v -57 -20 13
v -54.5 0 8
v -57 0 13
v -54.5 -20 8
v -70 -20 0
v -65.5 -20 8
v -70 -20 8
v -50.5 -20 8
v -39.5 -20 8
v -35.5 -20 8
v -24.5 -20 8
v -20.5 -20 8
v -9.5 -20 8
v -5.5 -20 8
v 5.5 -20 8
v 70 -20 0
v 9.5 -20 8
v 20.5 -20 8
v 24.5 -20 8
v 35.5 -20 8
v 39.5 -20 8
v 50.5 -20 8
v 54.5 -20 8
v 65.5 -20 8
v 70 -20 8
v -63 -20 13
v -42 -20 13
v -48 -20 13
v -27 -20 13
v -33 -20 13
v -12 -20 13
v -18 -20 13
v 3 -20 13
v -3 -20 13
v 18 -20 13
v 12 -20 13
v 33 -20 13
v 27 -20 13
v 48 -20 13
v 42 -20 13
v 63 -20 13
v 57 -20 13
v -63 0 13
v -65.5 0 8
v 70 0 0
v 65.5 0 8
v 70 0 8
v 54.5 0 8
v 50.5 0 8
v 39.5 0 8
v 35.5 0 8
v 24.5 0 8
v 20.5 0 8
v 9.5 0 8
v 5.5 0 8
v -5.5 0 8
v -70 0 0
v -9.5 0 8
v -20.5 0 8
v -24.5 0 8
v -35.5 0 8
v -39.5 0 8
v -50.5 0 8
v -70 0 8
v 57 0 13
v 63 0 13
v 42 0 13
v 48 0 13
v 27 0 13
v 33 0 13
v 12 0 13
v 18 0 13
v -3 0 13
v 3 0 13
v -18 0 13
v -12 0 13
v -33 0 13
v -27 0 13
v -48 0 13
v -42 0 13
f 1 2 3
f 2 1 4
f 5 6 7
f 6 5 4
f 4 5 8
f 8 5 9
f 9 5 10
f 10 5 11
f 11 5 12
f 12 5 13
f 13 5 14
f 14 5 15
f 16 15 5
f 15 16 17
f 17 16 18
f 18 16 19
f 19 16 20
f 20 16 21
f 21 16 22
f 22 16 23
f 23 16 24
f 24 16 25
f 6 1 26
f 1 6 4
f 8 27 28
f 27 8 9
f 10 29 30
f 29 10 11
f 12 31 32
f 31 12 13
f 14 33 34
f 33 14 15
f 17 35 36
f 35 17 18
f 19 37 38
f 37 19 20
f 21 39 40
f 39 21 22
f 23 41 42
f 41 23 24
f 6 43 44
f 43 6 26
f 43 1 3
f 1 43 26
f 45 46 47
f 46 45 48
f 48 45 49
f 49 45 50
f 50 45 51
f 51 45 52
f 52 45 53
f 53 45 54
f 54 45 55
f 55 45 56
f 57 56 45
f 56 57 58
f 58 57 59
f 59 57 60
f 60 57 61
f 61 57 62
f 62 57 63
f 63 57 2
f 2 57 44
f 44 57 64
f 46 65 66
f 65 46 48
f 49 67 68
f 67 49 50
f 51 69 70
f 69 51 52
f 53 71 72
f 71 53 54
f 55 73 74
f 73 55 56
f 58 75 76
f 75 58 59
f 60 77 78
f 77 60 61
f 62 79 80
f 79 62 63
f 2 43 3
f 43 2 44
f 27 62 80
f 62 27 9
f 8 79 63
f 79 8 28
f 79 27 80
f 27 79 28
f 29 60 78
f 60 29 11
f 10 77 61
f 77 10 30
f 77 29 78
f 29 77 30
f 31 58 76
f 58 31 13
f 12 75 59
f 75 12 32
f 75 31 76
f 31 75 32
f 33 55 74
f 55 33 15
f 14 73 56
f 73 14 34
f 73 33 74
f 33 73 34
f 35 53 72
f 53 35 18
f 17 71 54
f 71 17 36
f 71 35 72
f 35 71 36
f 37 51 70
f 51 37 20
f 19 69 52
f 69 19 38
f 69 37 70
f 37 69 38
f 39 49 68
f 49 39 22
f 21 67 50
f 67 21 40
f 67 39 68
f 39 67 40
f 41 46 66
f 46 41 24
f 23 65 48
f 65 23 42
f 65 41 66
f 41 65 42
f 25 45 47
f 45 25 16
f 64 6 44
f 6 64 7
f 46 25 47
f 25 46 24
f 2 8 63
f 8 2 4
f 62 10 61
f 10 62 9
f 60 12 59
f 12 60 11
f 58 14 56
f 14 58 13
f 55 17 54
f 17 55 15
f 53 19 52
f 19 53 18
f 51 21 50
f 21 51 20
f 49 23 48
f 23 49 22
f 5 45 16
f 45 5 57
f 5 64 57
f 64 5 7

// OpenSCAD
$fn = 32;

// ----------------------------------------------------------------------
// Toothed rack, 9 teeth
// 15 mm pitch, 5 mm teeth
// ----------------------------------------------------------------------

// --- parameters (mm) ---
bar_w = 20;   // bar width (Y)
bar_h = 8;    // bar height (Z)
teeth = 9;    // number of teeth
pitch = 15;   // tooth pitch
tooth_h = 5;  // tooth height above the bar
root_w = 12;  // tooth width at the root
crest_w = 6;  // tooth width at the crest

// --- derived feature positions (mm) ---
span = (teeth - 1) * pitch;  // = 120   distance between the outer teeth
bar_l = span + root_w + 8;   // = 140   bar length: teeth plus 4 mm at each end
tooth_x = -span / 2;         // = -60   X of the first tooth
height = bar_h + tooth_h;    // = 13   overall height
feature_centers = [
  [tooth_x + 0 * pitch, -bar_w / 2],
  [tooth_x + 1 * pitch, -bar_w / 2],
  [tooth_x + 2 * pitch, -bar_w / 2],
  [tooth_x + 3 * pitch, -bar_w / 2],
  [tooth_x + 4 * pitch, -bar_w / 2],
  [tooth_x + 5 * pitch, -bar_w / 2],
  [tooth_x + 6 * pitch, -bar_w / 2],
  [tooth_x + 7 * pitch, -bar_w / 2],
  [tooth_x + 8 * pitch, -bar_w / 2]
];   // tooth centre line, drives the tooth loop

// bar with a rack of teeth, one extruded trapezoium per centre
module rack_tooth() {
  linear_extrude(height = bar_w)
    polygon(points = [
      [0, 0],
      [root_w, 0],
      [root_w / 2 + crest_w / 2, tooth_h + 1],
      [root_w / 2 - crest_w / 2, tooth_h + 1]
    ]);
}

union() {
  translate([-bar_l / 2, -bar_w, 0]) cube([bar_l, bar_w, bar_h]);
  for (centre = feature_centers)
    translate([centre[0] - root_w / 2, 0, bar_h - 1]) rotate([90, 0, 0]) rack_tooth();
}
